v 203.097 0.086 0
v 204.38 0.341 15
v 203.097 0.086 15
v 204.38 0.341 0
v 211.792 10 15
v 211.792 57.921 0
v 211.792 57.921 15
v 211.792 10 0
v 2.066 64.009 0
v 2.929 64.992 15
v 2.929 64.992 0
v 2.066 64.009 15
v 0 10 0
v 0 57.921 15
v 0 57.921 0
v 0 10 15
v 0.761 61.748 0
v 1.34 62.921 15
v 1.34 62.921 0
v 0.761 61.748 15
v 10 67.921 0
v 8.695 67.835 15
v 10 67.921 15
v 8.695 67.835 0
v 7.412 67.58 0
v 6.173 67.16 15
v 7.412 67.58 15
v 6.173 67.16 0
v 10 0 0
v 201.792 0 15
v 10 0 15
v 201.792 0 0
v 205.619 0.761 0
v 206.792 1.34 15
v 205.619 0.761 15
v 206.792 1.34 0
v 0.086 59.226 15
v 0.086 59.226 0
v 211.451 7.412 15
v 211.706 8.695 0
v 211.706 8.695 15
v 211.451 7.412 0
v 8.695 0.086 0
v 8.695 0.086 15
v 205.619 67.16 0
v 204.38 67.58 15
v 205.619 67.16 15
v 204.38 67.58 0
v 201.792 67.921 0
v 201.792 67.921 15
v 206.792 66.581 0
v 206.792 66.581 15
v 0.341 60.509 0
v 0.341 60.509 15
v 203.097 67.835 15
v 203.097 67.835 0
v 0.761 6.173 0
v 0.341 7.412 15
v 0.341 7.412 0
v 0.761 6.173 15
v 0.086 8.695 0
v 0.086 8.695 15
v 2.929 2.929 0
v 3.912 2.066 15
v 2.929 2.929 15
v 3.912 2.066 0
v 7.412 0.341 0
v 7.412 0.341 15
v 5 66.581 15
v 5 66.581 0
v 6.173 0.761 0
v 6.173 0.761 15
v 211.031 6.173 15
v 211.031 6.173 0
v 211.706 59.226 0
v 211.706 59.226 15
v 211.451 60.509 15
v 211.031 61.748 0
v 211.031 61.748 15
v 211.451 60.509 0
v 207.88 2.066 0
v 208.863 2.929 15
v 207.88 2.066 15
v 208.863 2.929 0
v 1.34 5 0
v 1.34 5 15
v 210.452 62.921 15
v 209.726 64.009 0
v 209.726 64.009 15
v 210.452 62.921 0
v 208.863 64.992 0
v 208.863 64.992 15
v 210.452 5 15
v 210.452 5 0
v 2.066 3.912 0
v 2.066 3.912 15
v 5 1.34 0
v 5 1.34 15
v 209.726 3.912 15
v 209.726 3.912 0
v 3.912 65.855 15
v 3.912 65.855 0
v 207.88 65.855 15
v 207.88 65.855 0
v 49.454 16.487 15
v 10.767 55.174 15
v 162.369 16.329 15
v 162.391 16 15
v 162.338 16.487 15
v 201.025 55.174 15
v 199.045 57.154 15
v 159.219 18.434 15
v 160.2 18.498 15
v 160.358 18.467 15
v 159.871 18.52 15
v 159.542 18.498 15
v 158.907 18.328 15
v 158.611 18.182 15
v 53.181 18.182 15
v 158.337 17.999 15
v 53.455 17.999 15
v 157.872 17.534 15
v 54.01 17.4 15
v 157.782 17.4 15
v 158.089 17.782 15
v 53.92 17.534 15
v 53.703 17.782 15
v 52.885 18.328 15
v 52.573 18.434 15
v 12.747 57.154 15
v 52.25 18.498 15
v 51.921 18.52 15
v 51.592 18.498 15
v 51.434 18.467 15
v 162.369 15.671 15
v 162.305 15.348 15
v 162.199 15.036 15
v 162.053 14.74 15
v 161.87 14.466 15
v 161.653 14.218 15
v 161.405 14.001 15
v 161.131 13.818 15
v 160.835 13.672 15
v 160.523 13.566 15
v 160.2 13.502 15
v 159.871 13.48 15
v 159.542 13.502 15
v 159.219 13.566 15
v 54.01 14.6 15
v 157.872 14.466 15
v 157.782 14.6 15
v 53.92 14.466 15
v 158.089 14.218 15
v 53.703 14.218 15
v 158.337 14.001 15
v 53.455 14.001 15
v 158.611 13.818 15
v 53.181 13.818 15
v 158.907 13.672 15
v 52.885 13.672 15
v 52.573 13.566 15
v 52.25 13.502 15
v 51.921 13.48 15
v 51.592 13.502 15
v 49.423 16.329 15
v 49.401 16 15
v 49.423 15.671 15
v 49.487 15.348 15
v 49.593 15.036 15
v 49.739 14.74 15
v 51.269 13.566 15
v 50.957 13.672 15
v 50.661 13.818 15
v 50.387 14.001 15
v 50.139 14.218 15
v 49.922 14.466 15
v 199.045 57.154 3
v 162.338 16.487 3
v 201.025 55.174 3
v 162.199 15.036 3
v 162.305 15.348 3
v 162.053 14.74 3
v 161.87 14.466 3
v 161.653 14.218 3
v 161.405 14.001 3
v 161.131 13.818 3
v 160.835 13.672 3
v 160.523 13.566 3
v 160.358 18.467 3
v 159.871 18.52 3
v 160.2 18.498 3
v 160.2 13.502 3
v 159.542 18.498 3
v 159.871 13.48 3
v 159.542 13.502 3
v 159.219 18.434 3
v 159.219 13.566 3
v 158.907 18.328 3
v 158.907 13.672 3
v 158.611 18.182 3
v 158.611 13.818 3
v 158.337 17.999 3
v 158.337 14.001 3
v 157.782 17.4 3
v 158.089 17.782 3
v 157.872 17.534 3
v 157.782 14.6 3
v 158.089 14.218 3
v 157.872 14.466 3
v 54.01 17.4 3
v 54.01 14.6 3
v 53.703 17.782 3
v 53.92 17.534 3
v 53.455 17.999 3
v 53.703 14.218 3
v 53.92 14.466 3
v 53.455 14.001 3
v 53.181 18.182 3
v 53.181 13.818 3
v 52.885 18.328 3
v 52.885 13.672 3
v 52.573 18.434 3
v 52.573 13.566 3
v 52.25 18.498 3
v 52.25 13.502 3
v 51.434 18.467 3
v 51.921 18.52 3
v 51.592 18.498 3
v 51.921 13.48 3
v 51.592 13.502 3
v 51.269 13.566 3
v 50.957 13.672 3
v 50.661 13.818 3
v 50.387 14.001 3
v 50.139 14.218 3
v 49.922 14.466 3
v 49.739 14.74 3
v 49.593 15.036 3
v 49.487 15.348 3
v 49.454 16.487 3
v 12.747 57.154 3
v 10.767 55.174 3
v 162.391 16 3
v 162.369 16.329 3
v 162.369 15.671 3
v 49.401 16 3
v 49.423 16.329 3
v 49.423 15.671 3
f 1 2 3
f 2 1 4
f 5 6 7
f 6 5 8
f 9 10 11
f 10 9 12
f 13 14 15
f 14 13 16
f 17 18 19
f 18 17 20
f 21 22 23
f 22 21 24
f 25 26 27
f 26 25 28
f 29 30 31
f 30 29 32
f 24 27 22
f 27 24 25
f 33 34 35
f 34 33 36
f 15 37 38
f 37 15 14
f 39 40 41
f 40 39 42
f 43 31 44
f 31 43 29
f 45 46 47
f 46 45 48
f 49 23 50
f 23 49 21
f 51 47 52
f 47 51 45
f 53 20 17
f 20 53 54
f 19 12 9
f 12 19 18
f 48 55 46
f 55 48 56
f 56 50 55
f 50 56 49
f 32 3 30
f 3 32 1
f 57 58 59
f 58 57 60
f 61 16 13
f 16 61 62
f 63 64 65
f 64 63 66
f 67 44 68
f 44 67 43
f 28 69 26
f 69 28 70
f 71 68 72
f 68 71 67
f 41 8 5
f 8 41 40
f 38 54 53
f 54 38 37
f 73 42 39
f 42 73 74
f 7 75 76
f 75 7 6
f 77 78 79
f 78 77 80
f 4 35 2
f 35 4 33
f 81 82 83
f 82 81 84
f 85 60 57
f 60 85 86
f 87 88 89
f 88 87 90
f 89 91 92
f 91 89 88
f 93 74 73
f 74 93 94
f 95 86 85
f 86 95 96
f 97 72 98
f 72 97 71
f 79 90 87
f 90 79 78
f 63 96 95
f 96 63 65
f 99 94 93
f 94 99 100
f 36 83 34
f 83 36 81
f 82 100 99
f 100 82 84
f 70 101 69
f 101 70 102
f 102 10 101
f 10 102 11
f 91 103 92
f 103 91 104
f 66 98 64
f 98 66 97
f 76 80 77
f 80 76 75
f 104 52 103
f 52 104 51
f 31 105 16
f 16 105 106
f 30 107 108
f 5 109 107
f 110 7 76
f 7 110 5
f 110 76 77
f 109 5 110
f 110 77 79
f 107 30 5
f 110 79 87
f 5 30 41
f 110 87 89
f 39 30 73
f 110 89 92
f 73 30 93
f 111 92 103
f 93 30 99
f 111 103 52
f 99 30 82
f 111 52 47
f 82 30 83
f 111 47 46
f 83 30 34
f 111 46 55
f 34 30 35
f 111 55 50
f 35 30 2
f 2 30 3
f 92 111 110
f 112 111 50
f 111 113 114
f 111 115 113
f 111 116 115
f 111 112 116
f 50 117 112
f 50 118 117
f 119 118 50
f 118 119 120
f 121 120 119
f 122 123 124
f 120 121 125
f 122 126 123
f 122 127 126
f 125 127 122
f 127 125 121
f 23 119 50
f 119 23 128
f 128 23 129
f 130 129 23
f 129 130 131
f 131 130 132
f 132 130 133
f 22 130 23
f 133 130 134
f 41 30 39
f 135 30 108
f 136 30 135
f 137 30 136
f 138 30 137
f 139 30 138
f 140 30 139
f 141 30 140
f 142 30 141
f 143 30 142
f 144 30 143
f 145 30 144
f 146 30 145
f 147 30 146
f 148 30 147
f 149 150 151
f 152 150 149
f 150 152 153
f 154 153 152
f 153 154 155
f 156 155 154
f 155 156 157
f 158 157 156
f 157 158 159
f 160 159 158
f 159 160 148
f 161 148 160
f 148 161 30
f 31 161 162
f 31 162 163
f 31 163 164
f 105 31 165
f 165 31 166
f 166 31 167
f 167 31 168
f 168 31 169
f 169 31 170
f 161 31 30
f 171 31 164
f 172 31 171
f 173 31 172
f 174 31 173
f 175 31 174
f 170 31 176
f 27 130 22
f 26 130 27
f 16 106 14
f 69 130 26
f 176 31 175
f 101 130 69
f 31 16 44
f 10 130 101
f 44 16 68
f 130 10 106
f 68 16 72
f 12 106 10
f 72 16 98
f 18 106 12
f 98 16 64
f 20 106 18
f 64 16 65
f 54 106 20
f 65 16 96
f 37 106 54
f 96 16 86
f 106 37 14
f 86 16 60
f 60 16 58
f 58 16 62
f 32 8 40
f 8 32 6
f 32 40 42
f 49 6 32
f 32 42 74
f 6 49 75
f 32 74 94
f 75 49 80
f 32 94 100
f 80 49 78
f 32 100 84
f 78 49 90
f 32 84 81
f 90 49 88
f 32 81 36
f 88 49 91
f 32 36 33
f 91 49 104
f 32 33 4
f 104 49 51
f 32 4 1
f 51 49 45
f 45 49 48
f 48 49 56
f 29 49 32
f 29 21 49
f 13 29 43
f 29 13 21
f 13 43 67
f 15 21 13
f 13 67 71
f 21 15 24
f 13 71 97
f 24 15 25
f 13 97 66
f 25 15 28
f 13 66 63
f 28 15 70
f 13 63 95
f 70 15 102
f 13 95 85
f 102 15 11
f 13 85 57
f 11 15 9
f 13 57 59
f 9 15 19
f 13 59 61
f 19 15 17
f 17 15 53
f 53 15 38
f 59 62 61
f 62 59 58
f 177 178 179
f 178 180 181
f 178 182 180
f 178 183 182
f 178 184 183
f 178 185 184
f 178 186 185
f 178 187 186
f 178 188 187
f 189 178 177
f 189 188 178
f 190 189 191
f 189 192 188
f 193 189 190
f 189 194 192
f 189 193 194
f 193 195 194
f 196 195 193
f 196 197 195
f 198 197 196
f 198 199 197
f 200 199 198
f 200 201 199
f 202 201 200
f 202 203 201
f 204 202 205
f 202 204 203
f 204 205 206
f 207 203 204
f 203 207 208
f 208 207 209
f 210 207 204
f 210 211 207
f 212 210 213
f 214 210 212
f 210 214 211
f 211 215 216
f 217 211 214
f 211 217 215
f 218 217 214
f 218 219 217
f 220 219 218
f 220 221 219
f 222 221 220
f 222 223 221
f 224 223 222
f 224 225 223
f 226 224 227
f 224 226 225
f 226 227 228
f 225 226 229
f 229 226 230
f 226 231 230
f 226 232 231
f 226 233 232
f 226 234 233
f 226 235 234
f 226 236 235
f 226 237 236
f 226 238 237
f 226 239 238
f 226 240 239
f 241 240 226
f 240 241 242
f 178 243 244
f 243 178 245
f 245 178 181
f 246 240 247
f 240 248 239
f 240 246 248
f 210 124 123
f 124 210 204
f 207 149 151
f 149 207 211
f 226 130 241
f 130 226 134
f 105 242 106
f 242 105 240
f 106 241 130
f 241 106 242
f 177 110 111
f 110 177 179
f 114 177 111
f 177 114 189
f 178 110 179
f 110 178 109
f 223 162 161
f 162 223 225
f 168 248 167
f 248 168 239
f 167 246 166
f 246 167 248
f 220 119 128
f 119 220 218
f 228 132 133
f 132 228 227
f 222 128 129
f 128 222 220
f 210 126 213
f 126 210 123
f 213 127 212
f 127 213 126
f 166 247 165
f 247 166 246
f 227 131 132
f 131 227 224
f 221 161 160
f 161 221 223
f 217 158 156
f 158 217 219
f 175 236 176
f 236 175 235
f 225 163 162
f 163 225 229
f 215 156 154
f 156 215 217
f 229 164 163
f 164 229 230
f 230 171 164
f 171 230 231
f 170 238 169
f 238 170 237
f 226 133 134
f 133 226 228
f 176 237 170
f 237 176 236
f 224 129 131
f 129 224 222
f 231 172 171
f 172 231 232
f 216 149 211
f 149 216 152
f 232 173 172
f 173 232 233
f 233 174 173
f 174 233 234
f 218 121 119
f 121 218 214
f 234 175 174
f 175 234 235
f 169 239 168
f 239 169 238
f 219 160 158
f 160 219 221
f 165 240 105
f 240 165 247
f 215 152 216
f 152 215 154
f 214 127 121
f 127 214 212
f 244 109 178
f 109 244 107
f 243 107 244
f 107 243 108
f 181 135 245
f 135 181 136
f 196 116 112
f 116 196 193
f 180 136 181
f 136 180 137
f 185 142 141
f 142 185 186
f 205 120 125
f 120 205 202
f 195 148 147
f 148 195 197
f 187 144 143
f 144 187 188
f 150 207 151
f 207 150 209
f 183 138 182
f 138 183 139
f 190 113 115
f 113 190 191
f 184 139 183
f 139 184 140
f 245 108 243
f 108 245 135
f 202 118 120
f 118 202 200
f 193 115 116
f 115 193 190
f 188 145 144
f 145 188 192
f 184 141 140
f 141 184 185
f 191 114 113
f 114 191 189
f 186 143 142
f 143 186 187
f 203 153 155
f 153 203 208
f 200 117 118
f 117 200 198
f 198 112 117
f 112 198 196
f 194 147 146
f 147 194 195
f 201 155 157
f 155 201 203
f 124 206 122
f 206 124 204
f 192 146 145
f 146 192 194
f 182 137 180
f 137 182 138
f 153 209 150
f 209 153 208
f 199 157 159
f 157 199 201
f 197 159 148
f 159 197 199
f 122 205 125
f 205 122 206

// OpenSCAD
// ========================================================
// Family Birthday Card Display Stand
// ========================================================
//
// Designed for: Bambu Lab A1 - White PLA
// Layer height: 0.20mm, 15% infill, no supports needed
//
// Card dimensions (from hand-drawn sketch):
//   Center panel:  4.25" wide × 5.5" tall  (108 × 140 mm)
//   Side panels:   2.0"  wide × 5.5" tall  ( 51 × 140 mm each)
//   Top/Bot flaps: 4.25" wide × 2.625" tall (108 × 67 mm)
//
// Display layout (top-down view):
//
//   VIEWER
//     |
//     |   ___________
//     |  |           |   <- center panel faces viewer
//     |   \         /
//     |    \       /     <- side panels at 45° fanning backward
//     |     \_____/
//     |      (base)
//
// Build footprint: ~210 × 66 × 15 mm  (fits Bambu Lab A1 256×256mm bed)
// ========================================================

$fn = 48;

// ---- Card Dimensions (inches → mm) ----
CENTER_W = 4.25 * 25.4;    // 107.95 mm — center panel width
CENTER_H = 5.5  * 25.4;    // 139.70 mm — center panel height
SIDE_W   = 2.0  * 25.4;    //  50.80 mm — side panel width
FLAP_H   = 2.625 * 25.4;   //  66.68 mm — top / bottom flap height

// ---- Slot Parameters ----
// Adjust SLOT_W if card feels too tight or too loose after printing.
// Typical card stock + photo: 1.5–2.5 mm thick.
SLOT_W     = 2.8;   // slot opening width (paper thickness + clearance)
SLOT_DEPTH = 12.0;  // how deep card edge sits in slot (grip / stability)

// ---- Base Geometry ----
BASE_H   = 15.0;    // total base thickness (must be ≥ SLOT_DEPTH)
BORDER   = 16.0;    // material margin around active slot area
CORNER_R = 10.0;    // rounded-corner radius for aesthetics

// ---- Derived Values ----
ANGLE   = 45.0;
SIDE_DX = SIDE_W * cos(ANGLE);   // x-projection of side panel: ~35.9 mm
SIDE_DY = SIDE_W * sin(ANGLE);   // y-projection of side panel: ~35.9 mm

BASE_W = CENTER_W + 2*SIDE_DX + 2*BORDER;  // ≈ 208 mm
BASE_D = SIDE_DY + 2*BORDER;               // ≈  68 mm

CX     = BASE_W / 2;   // x-centre of base
Y_SLOT = BORDER;       // y-position of center-slot line (front of active zone)

// -- Console output for verification --
echo(str("=== DISPLAY STAND ==="));
echo(str("Width  : ", round(BASE_W*10)/10, " mm  (", round(BASE_W/25.4*10)/10, " in)"));
echo(str("Depth  : ", round(BASE_D*10)/10, " mm  (", round(BASE_D/25.4*10)/10, " in)"));
echo(str("Height : ", BASE_H, " mm"));
echo(str("Fits A1: ", BASE_W < 256 && BASE_D < 256 ? "YES" : "NO"));

// ========================================================
//  HELPER MODULES
// ========================================================

module rounded_plate(w, d, h, r) {
    hull() {
        translate([r,   r,   0]) cylinder(r=r, h=h);
        translate([w-r, r,   0]) cylinder(r=r, h=h);
        translate([r,   d-r, 0]) cylinder(r=r, h=h);
        translate([w-r, d-r, 0]) cylinder(r=r, h=h);
    }
}

// ========================================================
//  SLOT CUTS  (all extend from z = BASE_H−SLOT_DEPTH to z = BASE_H)
// ========================================================

// Center panel slot — runs left-right along front of base
module center_slot() {
    translate([CX - CENTER_W/2,
               Y_SLOT - SLOT_W/2,
               BASE_H - SLOT_DEPTH])
        cube([CENTER_W, SLOT_W, SLOT_DEPTH + 1]);
}

// Left panel slot — angles 135° (back-left) from left junction
module left_slot() {
    translate([CX - CENTER_W/2, Y_SLOT, BASE_H - SLOT_DEPTH])
        rotate([0, 0, 135])
            translate([0, -SLOT_W/2, 0])
                cube([SIDE_W + 6, SLOT_W, SLOT_DEPTH + 1]);
}

// Right panel slot — angles 45° (back-right) from right junction
module right_slot() {
    translate([CX + CENTER_W/2, Y_SLOT, BASE_H - SLOT_DEPTH])
        rotate([0, 0, 45])
            translate([0, -SLOT_W/2, 0])
                cube([SIDE_W + 6, SLOT_W, SLOT_DEPTH + 1]);
}

// Cylindrical relief at each junction — prevents card from binding at corners
// and gives a clean transition between slots
module junction_relief(x, y) {
    translate([x, y, BASE_H - SLOT_DEPTH])
        cylinder(r = SLOT_W * 0.9, h = SLOT_DEPTH + 1);
}

// ========================================================
//  MAIN MODEL
// ========================================================

module stand() {
    difference() {
        // Solid base plate with rounded corners
        rounded_plate(BASE_W, BASE_D, BASE_H, CORNER_R);

        // Slots for the three card sections
        center_slot();
        left_slot();
        right_slot();

        // Smooth the T-junctions so the card corners slide in cleanly
        junction_relief(CX - CENTER_W/2, Y_SLOT);
        junction_relief(CX + CENTER_W/2, Y_SLOT);
    }
}

stand();

// ========================================================
//  USAGE NOTES
// ========================================================
//
//  1. Open the card fully so all three panels are separated.
//  2. Insert the bottom edge of the CENTER panel into the
//     horizontal slot (front-center of base).
//  3. Insert the LEFT side panel into the diagonal slot on
//     the left — it naturally angles 45° backward.
//  4. Insert the RIGHT side panel into the diagonal slot on
//     the right — mirrors the left.
//  5. The TOP "Happy Birthday" flap rests forward at whatever
//     angle it naturally folds (approx 45°–60°).
//  6. The BOTTOM children's-drawing flap rests flat against
//     the front face of the base or folds under the stand.
//
//  PRINT SETTINGS (Bambu Lab A1):
//    Material : PLA - White
//    Layer    : 0.20 mm
//    Infill   : 15 % Gyroid
//    Supports : None required
//    Plate    : Print flat (Z = height of stand)
// ========================================================
